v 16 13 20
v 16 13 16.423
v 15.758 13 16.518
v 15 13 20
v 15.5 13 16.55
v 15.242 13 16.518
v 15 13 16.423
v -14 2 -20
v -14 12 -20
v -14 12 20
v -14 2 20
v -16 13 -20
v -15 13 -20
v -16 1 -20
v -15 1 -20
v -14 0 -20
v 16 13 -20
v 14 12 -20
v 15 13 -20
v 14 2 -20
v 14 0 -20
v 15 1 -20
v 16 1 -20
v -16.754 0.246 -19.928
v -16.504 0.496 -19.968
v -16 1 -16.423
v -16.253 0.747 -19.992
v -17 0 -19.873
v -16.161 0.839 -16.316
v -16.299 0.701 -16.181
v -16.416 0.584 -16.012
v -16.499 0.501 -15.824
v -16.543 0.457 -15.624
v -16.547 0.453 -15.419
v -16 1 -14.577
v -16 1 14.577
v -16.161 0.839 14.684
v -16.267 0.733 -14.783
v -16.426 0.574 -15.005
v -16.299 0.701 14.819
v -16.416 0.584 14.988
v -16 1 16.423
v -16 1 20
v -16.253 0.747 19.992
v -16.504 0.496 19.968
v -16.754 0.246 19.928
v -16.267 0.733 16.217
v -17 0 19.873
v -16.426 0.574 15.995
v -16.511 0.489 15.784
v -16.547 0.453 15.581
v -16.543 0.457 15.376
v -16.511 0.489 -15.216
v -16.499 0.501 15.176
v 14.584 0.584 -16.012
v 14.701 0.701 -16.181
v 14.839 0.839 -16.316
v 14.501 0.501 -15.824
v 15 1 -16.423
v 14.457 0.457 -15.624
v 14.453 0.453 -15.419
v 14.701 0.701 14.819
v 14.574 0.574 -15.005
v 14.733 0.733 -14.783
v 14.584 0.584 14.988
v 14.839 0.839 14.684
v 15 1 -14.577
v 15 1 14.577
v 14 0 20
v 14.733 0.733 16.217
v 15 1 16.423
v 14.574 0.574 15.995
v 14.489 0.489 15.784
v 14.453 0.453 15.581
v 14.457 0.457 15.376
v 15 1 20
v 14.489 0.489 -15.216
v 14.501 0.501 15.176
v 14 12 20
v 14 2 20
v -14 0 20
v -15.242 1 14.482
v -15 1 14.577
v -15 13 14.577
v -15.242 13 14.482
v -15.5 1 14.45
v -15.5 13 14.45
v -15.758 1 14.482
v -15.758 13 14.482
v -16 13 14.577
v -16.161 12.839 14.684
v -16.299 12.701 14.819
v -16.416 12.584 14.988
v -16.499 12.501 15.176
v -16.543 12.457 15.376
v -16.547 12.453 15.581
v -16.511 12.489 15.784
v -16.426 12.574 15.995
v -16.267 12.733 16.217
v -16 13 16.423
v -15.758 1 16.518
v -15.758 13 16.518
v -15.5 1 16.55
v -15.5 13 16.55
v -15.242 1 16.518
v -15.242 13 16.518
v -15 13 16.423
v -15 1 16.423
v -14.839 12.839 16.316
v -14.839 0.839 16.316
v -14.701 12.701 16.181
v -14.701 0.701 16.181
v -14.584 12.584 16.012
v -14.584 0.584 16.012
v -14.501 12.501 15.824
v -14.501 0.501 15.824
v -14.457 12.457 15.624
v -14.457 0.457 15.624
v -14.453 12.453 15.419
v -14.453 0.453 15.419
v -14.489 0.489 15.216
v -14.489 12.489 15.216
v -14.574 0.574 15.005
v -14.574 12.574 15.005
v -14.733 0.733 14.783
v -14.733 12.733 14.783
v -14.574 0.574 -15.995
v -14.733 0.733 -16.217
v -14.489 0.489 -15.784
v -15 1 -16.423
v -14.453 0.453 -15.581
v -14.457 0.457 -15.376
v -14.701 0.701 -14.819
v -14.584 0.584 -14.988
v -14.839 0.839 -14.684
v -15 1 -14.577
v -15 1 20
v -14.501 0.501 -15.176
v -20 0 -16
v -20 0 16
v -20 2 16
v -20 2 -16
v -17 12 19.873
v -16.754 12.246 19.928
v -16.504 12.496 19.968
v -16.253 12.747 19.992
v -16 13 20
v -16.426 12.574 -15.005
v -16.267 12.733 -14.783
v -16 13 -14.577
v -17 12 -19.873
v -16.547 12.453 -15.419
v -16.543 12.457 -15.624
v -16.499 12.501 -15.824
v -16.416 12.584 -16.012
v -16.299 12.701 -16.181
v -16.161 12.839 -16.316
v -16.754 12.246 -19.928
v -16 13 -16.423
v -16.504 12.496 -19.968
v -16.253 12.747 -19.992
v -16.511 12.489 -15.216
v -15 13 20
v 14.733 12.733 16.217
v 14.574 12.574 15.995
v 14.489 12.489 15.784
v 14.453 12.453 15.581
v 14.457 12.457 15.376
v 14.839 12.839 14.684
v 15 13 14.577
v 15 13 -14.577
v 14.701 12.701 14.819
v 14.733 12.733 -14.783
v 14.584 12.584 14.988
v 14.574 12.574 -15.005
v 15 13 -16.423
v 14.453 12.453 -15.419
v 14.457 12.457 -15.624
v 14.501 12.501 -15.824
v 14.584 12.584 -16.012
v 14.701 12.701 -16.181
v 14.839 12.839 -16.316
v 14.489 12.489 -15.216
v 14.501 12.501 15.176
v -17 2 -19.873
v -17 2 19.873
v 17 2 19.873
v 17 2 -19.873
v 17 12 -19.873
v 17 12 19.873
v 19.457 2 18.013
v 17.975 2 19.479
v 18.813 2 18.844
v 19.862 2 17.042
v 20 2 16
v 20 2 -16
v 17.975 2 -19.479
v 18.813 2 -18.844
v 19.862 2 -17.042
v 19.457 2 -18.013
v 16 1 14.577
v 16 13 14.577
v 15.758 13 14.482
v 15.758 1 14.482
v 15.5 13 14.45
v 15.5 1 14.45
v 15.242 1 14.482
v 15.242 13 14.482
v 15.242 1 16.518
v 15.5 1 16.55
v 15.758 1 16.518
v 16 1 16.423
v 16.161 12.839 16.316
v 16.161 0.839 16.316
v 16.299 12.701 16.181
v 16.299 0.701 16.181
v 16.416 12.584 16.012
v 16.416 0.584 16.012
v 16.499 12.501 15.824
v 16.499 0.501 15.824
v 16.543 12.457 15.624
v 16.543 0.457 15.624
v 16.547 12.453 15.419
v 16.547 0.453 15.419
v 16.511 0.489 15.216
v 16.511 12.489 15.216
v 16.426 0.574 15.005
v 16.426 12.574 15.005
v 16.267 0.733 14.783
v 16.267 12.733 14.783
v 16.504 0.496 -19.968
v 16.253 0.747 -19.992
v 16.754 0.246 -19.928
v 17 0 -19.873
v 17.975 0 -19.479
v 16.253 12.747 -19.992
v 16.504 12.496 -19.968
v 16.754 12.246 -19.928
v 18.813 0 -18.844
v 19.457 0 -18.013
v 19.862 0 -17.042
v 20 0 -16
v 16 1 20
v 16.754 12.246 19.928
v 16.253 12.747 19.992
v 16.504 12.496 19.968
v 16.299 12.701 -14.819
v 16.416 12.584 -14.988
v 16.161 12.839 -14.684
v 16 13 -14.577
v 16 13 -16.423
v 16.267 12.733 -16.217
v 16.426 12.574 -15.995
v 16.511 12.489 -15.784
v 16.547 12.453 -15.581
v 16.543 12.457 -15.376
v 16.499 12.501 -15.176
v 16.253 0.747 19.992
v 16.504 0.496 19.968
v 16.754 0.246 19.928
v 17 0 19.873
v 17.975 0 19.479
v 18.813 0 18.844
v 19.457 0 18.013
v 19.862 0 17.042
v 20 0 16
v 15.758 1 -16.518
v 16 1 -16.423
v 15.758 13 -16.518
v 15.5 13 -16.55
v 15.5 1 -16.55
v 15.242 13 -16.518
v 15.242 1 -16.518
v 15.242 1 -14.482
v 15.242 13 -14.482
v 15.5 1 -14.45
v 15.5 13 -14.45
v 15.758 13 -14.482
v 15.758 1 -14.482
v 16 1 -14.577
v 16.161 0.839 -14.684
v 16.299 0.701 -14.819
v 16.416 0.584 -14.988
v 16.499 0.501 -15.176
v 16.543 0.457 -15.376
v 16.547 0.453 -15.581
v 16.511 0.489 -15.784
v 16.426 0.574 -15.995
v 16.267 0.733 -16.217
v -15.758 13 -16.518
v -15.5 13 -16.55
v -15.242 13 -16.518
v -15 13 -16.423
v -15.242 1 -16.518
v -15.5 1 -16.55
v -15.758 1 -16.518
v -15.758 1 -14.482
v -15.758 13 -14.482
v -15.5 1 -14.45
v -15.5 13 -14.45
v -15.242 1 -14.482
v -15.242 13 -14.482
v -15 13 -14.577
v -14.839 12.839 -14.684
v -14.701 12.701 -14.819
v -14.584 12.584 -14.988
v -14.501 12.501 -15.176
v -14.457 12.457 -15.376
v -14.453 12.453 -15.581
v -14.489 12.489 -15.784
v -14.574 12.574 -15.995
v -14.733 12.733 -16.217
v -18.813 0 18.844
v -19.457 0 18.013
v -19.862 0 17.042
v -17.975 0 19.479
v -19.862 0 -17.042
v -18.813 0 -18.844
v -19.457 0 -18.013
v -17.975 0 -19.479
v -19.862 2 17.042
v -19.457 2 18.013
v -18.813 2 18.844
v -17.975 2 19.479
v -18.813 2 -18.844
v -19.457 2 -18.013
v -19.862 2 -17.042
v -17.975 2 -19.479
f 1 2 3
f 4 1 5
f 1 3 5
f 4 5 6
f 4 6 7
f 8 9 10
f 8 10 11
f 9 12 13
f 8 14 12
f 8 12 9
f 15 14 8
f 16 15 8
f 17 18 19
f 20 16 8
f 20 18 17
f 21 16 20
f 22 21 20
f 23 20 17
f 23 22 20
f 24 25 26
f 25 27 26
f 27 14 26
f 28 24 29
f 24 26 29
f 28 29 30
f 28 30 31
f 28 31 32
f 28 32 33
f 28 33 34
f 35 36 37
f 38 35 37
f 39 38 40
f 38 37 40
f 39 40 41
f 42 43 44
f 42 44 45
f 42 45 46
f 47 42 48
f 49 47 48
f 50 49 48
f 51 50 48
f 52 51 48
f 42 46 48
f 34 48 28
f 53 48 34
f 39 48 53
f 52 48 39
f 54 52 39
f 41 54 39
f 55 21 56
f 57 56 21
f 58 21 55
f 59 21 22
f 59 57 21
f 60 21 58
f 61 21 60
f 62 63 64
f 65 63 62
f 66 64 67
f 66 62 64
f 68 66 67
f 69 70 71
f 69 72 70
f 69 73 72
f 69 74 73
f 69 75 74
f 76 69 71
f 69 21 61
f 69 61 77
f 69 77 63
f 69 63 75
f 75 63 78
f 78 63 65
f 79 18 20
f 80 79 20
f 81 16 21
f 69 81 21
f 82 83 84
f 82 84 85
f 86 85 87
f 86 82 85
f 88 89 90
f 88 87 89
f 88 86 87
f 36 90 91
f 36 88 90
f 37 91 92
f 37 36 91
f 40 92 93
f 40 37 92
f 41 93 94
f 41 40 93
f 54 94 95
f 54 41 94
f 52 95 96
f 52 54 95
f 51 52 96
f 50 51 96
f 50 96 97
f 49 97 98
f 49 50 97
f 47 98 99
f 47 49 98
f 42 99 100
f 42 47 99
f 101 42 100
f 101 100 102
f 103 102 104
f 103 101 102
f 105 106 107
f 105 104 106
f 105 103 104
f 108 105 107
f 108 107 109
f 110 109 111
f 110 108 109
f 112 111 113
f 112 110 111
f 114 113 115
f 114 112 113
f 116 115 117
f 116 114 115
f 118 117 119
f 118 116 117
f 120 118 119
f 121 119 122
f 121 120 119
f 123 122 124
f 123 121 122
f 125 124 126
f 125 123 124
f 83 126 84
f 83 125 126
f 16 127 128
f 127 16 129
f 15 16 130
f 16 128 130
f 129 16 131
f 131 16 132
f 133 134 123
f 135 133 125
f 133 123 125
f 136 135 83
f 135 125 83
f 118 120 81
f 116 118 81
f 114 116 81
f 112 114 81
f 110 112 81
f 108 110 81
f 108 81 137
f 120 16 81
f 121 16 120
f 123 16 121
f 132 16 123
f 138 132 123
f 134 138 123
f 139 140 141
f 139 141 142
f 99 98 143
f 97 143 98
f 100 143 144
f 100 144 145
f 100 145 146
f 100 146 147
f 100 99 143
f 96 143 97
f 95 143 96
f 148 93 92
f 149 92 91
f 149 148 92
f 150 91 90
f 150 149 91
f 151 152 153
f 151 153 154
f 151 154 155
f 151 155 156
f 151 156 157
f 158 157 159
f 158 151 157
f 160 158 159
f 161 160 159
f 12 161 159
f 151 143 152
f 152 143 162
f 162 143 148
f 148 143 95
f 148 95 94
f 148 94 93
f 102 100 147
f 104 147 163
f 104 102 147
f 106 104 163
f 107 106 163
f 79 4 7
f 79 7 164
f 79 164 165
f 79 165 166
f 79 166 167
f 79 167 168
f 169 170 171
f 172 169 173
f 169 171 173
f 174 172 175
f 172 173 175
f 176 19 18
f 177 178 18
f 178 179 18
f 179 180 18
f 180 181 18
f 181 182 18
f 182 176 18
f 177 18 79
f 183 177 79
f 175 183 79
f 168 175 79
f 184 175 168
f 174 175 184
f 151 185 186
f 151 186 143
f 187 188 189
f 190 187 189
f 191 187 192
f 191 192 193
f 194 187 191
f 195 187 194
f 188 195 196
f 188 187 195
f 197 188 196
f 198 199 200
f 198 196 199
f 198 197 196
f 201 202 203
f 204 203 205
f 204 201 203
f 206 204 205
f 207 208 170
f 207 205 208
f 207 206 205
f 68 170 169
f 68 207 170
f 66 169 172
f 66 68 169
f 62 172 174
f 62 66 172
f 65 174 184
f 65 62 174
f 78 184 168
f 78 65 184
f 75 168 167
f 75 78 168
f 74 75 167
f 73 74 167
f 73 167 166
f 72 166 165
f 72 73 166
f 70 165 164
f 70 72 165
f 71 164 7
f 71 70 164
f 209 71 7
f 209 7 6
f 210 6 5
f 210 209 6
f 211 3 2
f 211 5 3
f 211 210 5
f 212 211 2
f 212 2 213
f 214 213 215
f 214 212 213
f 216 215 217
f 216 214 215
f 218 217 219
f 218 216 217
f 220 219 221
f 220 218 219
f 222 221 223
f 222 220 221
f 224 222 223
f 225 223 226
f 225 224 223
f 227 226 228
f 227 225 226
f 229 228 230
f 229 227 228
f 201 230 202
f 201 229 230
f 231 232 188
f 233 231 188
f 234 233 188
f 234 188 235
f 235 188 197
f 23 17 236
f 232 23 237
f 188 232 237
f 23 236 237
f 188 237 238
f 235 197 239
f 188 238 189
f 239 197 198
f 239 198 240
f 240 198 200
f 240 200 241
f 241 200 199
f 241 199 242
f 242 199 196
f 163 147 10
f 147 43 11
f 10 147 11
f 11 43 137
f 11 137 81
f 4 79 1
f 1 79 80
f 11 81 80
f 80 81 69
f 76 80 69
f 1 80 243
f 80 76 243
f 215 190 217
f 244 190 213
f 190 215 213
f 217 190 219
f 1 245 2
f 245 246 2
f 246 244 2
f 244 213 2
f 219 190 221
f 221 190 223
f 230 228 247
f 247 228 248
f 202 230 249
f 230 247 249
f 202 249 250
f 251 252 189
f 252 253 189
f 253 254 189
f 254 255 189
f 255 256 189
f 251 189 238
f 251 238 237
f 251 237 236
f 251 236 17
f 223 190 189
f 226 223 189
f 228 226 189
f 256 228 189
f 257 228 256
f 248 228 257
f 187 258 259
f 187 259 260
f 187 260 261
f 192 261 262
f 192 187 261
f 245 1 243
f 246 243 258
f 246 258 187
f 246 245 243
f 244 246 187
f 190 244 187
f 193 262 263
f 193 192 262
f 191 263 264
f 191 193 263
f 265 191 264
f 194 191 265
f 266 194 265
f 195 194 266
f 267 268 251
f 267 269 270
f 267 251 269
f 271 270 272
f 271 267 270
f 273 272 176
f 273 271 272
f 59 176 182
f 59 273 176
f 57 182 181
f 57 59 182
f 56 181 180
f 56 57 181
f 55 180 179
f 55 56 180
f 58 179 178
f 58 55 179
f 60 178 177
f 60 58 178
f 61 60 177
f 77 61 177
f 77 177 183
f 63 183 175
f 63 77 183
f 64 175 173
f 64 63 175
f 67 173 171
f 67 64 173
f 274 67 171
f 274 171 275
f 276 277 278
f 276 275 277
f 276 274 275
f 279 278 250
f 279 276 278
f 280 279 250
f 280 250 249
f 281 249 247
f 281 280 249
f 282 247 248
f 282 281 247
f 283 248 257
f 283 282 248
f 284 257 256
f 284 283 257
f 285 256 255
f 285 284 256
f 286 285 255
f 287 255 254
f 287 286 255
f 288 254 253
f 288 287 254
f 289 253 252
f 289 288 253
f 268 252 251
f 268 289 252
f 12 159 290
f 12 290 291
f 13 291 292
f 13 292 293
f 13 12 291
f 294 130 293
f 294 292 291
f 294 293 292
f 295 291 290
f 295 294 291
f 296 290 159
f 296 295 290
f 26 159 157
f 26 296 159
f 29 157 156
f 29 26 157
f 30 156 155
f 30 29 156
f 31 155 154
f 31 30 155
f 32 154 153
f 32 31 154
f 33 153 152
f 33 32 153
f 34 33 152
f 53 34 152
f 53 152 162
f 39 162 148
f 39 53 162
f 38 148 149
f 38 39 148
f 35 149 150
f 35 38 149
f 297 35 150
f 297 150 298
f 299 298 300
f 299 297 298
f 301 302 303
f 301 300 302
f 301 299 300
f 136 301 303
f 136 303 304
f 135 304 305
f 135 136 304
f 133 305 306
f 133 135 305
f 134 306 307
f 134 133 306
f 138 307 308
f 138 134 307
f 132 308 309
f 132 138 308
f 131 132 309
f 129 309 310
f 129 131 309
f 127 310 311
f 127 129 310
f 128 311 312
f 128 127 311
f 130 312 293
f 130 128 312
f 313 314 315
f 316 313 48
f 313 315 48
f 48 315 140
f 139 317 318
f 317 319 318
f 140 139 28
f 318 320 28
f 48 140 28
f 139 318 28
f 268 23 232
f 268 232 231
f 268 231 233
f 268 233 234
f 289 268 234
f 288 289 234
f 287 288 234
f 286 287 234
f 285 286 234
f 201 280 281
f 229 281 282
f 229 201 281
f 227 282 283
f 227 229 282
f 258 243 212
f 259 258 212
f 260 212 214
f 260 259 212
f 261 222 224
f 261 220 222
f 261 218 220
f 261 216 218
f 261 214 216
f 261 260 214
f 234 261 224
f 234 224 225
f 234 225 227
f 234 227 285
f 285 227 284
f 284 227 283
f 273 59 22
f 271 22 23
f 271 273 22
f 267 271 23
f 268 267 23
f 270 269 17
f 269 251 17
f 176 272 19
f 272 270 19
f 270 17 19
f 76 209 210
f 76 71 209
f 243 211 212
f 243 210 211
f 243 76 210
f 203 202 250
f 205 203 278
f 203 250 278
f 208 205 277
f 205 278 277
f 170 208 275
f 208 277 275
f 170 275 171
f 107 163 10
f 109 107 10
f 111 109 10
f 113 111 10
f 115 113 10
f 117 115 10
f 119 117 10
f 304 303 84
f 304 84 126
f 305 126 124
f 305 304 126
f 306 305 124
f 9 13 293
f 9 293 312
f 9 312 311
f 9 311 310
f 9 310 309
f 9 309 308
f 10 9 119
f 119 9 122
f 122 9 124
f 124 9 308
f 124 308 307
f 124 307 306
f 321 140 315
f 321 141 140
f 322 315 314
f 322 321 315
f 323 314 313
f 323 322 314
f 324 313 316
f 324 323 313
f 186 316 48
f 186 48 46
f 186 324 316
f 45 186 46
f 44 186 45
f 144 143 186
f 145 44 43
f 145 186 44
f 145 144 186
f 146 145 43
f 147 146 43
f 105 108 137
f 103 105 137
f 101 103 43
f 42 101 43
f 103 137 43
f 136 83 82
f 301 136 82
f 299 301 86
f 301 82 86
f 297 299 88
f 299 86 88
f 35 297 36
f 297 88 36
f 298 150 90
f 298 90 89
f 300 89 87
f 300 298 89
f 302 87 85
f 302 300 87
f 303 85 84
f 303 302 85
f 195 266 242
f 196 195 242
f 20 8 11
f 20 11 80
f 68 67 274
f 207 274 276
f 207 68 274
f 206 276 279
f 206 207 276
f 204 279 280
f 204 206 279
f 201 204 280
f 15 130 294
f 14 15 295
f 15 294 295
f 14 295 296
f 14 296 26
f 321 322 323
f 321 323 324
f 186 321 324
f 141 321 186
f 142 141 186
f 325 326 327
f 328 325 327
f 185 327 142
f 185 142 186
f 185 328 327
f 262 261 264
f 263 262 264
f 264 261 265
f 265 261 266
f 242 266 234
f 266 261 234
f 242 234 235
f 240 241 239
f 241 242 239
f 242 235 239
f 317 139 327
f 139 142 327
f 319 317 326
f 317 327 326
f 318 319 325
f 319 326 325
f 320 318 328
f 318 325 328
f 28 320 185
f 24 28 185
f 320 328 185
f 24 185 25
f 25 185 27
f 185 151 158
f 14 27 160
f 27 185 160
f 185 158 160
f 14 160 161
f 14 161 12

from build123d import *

# Parameters (mm, degrees)
SKETCH1_W           = 40
SKETCH1_H           = 40
BOSS_EXTRUDE1_DEPTH = 2
CUT_EXTRUDE1_DEPTH  = 45.766058571
BOSS_EXTRUDE2_START = -40
BOSS_EXTRUDE2_DEPTH = 40
FILLET1_R           = 4
SKETCH6_R           = 1.05
CUT_EXTRUDE4_DEPTH  = 32.128764833


with BuildPart() as part:
    # Sketch1 → Boss-Extrude1 (new body)
    with BuildSketch(Plane(origin=(0, 0, 0), x_dir=(1, 0, 0), z_dir=(0, 1, 0))):
        Rectangle(SKETCH1_W, SKETCH1_H)
    extrude(amount=BOSS_EXTRUDE1_DEPTH)

    # Sketch2 → Cut-Extrude1 (cut, through all)
    with BuildSketch(Plane.XY.offset(20)):
        Polygon((14, 0), (15, 1), (16, 1), (17, 0), align=None)
    cut_extrude1 = extrude(amount=-CUT_EXTRUDE1_DEPTH, mode=Mode.SUBTRACT)

    # Sketch3 → Boss-Extrude2 (add)
    with BuildSketch(Plane.XY.offset(20).offset(BOSS_EXTRUDE2_START)):
        Polygon((17, 12), (16, 13), (15, 13), (14, 12), (14, 2), (17, 2), align=None)
    boss_extrude2 = extrude(amount=BOSS_EXTRUDE2_DEPTH)

    # Mirror2: Cut-Extrude1, Boss-Extrude2 across plane
    add(cut_extrude1.mirror(Plane(origin=(0, 0, 0), x_dir=(0, 0, 1), z_dir=(1, 0, 0))), mode=Mode.SUBTRACT)
    add(boss_extrude2.mirror(Plane(origin=(0, 0, 0), x_dir=(0, 0, 1), z_dir=(1, 0, 0))))

    # Fillet1
    fillet1_edges = [part.edges().sort_by_distance(p)[0] for p in [
        (-20, 1, 20),
        (20, 1, 20),
        (20, 1, -20),
        (-20, 1, -20),
    ]]
    fillet(fillet1_edges, radius=FILLET1_R)

    # Sketch6 → Cut-Extrude4 (cut, through all)
    with BuildSketch(Plane(origin=(0, 0, 0), x_dir=(1, 0, 0), z_dir=(0, 1, 0))):
        with Locations(Location((-15.5, 15.5, 0), (0, 0, 61.563109851))):
            Circle(SKETCH6_R)
        with Locations(Location((15.5, 15.5, 0), (0, 0, 61.563109851))):
            Circle(SKETCH6_R)
        with Locations(Location((-15.5, -15.5, 0), (0, 0, 61.563109851))):
            Circle(SKETCH6_R)
        with Locations(Location((15.5, -15.5, 0), (0, 0, 61.563109851))):
            Circle(SKETCH6_R)
    extrude(amount=CUT_EXTRUDE4_DEPTH, mode=Mode.SUBTRACT)


solid = part.part
